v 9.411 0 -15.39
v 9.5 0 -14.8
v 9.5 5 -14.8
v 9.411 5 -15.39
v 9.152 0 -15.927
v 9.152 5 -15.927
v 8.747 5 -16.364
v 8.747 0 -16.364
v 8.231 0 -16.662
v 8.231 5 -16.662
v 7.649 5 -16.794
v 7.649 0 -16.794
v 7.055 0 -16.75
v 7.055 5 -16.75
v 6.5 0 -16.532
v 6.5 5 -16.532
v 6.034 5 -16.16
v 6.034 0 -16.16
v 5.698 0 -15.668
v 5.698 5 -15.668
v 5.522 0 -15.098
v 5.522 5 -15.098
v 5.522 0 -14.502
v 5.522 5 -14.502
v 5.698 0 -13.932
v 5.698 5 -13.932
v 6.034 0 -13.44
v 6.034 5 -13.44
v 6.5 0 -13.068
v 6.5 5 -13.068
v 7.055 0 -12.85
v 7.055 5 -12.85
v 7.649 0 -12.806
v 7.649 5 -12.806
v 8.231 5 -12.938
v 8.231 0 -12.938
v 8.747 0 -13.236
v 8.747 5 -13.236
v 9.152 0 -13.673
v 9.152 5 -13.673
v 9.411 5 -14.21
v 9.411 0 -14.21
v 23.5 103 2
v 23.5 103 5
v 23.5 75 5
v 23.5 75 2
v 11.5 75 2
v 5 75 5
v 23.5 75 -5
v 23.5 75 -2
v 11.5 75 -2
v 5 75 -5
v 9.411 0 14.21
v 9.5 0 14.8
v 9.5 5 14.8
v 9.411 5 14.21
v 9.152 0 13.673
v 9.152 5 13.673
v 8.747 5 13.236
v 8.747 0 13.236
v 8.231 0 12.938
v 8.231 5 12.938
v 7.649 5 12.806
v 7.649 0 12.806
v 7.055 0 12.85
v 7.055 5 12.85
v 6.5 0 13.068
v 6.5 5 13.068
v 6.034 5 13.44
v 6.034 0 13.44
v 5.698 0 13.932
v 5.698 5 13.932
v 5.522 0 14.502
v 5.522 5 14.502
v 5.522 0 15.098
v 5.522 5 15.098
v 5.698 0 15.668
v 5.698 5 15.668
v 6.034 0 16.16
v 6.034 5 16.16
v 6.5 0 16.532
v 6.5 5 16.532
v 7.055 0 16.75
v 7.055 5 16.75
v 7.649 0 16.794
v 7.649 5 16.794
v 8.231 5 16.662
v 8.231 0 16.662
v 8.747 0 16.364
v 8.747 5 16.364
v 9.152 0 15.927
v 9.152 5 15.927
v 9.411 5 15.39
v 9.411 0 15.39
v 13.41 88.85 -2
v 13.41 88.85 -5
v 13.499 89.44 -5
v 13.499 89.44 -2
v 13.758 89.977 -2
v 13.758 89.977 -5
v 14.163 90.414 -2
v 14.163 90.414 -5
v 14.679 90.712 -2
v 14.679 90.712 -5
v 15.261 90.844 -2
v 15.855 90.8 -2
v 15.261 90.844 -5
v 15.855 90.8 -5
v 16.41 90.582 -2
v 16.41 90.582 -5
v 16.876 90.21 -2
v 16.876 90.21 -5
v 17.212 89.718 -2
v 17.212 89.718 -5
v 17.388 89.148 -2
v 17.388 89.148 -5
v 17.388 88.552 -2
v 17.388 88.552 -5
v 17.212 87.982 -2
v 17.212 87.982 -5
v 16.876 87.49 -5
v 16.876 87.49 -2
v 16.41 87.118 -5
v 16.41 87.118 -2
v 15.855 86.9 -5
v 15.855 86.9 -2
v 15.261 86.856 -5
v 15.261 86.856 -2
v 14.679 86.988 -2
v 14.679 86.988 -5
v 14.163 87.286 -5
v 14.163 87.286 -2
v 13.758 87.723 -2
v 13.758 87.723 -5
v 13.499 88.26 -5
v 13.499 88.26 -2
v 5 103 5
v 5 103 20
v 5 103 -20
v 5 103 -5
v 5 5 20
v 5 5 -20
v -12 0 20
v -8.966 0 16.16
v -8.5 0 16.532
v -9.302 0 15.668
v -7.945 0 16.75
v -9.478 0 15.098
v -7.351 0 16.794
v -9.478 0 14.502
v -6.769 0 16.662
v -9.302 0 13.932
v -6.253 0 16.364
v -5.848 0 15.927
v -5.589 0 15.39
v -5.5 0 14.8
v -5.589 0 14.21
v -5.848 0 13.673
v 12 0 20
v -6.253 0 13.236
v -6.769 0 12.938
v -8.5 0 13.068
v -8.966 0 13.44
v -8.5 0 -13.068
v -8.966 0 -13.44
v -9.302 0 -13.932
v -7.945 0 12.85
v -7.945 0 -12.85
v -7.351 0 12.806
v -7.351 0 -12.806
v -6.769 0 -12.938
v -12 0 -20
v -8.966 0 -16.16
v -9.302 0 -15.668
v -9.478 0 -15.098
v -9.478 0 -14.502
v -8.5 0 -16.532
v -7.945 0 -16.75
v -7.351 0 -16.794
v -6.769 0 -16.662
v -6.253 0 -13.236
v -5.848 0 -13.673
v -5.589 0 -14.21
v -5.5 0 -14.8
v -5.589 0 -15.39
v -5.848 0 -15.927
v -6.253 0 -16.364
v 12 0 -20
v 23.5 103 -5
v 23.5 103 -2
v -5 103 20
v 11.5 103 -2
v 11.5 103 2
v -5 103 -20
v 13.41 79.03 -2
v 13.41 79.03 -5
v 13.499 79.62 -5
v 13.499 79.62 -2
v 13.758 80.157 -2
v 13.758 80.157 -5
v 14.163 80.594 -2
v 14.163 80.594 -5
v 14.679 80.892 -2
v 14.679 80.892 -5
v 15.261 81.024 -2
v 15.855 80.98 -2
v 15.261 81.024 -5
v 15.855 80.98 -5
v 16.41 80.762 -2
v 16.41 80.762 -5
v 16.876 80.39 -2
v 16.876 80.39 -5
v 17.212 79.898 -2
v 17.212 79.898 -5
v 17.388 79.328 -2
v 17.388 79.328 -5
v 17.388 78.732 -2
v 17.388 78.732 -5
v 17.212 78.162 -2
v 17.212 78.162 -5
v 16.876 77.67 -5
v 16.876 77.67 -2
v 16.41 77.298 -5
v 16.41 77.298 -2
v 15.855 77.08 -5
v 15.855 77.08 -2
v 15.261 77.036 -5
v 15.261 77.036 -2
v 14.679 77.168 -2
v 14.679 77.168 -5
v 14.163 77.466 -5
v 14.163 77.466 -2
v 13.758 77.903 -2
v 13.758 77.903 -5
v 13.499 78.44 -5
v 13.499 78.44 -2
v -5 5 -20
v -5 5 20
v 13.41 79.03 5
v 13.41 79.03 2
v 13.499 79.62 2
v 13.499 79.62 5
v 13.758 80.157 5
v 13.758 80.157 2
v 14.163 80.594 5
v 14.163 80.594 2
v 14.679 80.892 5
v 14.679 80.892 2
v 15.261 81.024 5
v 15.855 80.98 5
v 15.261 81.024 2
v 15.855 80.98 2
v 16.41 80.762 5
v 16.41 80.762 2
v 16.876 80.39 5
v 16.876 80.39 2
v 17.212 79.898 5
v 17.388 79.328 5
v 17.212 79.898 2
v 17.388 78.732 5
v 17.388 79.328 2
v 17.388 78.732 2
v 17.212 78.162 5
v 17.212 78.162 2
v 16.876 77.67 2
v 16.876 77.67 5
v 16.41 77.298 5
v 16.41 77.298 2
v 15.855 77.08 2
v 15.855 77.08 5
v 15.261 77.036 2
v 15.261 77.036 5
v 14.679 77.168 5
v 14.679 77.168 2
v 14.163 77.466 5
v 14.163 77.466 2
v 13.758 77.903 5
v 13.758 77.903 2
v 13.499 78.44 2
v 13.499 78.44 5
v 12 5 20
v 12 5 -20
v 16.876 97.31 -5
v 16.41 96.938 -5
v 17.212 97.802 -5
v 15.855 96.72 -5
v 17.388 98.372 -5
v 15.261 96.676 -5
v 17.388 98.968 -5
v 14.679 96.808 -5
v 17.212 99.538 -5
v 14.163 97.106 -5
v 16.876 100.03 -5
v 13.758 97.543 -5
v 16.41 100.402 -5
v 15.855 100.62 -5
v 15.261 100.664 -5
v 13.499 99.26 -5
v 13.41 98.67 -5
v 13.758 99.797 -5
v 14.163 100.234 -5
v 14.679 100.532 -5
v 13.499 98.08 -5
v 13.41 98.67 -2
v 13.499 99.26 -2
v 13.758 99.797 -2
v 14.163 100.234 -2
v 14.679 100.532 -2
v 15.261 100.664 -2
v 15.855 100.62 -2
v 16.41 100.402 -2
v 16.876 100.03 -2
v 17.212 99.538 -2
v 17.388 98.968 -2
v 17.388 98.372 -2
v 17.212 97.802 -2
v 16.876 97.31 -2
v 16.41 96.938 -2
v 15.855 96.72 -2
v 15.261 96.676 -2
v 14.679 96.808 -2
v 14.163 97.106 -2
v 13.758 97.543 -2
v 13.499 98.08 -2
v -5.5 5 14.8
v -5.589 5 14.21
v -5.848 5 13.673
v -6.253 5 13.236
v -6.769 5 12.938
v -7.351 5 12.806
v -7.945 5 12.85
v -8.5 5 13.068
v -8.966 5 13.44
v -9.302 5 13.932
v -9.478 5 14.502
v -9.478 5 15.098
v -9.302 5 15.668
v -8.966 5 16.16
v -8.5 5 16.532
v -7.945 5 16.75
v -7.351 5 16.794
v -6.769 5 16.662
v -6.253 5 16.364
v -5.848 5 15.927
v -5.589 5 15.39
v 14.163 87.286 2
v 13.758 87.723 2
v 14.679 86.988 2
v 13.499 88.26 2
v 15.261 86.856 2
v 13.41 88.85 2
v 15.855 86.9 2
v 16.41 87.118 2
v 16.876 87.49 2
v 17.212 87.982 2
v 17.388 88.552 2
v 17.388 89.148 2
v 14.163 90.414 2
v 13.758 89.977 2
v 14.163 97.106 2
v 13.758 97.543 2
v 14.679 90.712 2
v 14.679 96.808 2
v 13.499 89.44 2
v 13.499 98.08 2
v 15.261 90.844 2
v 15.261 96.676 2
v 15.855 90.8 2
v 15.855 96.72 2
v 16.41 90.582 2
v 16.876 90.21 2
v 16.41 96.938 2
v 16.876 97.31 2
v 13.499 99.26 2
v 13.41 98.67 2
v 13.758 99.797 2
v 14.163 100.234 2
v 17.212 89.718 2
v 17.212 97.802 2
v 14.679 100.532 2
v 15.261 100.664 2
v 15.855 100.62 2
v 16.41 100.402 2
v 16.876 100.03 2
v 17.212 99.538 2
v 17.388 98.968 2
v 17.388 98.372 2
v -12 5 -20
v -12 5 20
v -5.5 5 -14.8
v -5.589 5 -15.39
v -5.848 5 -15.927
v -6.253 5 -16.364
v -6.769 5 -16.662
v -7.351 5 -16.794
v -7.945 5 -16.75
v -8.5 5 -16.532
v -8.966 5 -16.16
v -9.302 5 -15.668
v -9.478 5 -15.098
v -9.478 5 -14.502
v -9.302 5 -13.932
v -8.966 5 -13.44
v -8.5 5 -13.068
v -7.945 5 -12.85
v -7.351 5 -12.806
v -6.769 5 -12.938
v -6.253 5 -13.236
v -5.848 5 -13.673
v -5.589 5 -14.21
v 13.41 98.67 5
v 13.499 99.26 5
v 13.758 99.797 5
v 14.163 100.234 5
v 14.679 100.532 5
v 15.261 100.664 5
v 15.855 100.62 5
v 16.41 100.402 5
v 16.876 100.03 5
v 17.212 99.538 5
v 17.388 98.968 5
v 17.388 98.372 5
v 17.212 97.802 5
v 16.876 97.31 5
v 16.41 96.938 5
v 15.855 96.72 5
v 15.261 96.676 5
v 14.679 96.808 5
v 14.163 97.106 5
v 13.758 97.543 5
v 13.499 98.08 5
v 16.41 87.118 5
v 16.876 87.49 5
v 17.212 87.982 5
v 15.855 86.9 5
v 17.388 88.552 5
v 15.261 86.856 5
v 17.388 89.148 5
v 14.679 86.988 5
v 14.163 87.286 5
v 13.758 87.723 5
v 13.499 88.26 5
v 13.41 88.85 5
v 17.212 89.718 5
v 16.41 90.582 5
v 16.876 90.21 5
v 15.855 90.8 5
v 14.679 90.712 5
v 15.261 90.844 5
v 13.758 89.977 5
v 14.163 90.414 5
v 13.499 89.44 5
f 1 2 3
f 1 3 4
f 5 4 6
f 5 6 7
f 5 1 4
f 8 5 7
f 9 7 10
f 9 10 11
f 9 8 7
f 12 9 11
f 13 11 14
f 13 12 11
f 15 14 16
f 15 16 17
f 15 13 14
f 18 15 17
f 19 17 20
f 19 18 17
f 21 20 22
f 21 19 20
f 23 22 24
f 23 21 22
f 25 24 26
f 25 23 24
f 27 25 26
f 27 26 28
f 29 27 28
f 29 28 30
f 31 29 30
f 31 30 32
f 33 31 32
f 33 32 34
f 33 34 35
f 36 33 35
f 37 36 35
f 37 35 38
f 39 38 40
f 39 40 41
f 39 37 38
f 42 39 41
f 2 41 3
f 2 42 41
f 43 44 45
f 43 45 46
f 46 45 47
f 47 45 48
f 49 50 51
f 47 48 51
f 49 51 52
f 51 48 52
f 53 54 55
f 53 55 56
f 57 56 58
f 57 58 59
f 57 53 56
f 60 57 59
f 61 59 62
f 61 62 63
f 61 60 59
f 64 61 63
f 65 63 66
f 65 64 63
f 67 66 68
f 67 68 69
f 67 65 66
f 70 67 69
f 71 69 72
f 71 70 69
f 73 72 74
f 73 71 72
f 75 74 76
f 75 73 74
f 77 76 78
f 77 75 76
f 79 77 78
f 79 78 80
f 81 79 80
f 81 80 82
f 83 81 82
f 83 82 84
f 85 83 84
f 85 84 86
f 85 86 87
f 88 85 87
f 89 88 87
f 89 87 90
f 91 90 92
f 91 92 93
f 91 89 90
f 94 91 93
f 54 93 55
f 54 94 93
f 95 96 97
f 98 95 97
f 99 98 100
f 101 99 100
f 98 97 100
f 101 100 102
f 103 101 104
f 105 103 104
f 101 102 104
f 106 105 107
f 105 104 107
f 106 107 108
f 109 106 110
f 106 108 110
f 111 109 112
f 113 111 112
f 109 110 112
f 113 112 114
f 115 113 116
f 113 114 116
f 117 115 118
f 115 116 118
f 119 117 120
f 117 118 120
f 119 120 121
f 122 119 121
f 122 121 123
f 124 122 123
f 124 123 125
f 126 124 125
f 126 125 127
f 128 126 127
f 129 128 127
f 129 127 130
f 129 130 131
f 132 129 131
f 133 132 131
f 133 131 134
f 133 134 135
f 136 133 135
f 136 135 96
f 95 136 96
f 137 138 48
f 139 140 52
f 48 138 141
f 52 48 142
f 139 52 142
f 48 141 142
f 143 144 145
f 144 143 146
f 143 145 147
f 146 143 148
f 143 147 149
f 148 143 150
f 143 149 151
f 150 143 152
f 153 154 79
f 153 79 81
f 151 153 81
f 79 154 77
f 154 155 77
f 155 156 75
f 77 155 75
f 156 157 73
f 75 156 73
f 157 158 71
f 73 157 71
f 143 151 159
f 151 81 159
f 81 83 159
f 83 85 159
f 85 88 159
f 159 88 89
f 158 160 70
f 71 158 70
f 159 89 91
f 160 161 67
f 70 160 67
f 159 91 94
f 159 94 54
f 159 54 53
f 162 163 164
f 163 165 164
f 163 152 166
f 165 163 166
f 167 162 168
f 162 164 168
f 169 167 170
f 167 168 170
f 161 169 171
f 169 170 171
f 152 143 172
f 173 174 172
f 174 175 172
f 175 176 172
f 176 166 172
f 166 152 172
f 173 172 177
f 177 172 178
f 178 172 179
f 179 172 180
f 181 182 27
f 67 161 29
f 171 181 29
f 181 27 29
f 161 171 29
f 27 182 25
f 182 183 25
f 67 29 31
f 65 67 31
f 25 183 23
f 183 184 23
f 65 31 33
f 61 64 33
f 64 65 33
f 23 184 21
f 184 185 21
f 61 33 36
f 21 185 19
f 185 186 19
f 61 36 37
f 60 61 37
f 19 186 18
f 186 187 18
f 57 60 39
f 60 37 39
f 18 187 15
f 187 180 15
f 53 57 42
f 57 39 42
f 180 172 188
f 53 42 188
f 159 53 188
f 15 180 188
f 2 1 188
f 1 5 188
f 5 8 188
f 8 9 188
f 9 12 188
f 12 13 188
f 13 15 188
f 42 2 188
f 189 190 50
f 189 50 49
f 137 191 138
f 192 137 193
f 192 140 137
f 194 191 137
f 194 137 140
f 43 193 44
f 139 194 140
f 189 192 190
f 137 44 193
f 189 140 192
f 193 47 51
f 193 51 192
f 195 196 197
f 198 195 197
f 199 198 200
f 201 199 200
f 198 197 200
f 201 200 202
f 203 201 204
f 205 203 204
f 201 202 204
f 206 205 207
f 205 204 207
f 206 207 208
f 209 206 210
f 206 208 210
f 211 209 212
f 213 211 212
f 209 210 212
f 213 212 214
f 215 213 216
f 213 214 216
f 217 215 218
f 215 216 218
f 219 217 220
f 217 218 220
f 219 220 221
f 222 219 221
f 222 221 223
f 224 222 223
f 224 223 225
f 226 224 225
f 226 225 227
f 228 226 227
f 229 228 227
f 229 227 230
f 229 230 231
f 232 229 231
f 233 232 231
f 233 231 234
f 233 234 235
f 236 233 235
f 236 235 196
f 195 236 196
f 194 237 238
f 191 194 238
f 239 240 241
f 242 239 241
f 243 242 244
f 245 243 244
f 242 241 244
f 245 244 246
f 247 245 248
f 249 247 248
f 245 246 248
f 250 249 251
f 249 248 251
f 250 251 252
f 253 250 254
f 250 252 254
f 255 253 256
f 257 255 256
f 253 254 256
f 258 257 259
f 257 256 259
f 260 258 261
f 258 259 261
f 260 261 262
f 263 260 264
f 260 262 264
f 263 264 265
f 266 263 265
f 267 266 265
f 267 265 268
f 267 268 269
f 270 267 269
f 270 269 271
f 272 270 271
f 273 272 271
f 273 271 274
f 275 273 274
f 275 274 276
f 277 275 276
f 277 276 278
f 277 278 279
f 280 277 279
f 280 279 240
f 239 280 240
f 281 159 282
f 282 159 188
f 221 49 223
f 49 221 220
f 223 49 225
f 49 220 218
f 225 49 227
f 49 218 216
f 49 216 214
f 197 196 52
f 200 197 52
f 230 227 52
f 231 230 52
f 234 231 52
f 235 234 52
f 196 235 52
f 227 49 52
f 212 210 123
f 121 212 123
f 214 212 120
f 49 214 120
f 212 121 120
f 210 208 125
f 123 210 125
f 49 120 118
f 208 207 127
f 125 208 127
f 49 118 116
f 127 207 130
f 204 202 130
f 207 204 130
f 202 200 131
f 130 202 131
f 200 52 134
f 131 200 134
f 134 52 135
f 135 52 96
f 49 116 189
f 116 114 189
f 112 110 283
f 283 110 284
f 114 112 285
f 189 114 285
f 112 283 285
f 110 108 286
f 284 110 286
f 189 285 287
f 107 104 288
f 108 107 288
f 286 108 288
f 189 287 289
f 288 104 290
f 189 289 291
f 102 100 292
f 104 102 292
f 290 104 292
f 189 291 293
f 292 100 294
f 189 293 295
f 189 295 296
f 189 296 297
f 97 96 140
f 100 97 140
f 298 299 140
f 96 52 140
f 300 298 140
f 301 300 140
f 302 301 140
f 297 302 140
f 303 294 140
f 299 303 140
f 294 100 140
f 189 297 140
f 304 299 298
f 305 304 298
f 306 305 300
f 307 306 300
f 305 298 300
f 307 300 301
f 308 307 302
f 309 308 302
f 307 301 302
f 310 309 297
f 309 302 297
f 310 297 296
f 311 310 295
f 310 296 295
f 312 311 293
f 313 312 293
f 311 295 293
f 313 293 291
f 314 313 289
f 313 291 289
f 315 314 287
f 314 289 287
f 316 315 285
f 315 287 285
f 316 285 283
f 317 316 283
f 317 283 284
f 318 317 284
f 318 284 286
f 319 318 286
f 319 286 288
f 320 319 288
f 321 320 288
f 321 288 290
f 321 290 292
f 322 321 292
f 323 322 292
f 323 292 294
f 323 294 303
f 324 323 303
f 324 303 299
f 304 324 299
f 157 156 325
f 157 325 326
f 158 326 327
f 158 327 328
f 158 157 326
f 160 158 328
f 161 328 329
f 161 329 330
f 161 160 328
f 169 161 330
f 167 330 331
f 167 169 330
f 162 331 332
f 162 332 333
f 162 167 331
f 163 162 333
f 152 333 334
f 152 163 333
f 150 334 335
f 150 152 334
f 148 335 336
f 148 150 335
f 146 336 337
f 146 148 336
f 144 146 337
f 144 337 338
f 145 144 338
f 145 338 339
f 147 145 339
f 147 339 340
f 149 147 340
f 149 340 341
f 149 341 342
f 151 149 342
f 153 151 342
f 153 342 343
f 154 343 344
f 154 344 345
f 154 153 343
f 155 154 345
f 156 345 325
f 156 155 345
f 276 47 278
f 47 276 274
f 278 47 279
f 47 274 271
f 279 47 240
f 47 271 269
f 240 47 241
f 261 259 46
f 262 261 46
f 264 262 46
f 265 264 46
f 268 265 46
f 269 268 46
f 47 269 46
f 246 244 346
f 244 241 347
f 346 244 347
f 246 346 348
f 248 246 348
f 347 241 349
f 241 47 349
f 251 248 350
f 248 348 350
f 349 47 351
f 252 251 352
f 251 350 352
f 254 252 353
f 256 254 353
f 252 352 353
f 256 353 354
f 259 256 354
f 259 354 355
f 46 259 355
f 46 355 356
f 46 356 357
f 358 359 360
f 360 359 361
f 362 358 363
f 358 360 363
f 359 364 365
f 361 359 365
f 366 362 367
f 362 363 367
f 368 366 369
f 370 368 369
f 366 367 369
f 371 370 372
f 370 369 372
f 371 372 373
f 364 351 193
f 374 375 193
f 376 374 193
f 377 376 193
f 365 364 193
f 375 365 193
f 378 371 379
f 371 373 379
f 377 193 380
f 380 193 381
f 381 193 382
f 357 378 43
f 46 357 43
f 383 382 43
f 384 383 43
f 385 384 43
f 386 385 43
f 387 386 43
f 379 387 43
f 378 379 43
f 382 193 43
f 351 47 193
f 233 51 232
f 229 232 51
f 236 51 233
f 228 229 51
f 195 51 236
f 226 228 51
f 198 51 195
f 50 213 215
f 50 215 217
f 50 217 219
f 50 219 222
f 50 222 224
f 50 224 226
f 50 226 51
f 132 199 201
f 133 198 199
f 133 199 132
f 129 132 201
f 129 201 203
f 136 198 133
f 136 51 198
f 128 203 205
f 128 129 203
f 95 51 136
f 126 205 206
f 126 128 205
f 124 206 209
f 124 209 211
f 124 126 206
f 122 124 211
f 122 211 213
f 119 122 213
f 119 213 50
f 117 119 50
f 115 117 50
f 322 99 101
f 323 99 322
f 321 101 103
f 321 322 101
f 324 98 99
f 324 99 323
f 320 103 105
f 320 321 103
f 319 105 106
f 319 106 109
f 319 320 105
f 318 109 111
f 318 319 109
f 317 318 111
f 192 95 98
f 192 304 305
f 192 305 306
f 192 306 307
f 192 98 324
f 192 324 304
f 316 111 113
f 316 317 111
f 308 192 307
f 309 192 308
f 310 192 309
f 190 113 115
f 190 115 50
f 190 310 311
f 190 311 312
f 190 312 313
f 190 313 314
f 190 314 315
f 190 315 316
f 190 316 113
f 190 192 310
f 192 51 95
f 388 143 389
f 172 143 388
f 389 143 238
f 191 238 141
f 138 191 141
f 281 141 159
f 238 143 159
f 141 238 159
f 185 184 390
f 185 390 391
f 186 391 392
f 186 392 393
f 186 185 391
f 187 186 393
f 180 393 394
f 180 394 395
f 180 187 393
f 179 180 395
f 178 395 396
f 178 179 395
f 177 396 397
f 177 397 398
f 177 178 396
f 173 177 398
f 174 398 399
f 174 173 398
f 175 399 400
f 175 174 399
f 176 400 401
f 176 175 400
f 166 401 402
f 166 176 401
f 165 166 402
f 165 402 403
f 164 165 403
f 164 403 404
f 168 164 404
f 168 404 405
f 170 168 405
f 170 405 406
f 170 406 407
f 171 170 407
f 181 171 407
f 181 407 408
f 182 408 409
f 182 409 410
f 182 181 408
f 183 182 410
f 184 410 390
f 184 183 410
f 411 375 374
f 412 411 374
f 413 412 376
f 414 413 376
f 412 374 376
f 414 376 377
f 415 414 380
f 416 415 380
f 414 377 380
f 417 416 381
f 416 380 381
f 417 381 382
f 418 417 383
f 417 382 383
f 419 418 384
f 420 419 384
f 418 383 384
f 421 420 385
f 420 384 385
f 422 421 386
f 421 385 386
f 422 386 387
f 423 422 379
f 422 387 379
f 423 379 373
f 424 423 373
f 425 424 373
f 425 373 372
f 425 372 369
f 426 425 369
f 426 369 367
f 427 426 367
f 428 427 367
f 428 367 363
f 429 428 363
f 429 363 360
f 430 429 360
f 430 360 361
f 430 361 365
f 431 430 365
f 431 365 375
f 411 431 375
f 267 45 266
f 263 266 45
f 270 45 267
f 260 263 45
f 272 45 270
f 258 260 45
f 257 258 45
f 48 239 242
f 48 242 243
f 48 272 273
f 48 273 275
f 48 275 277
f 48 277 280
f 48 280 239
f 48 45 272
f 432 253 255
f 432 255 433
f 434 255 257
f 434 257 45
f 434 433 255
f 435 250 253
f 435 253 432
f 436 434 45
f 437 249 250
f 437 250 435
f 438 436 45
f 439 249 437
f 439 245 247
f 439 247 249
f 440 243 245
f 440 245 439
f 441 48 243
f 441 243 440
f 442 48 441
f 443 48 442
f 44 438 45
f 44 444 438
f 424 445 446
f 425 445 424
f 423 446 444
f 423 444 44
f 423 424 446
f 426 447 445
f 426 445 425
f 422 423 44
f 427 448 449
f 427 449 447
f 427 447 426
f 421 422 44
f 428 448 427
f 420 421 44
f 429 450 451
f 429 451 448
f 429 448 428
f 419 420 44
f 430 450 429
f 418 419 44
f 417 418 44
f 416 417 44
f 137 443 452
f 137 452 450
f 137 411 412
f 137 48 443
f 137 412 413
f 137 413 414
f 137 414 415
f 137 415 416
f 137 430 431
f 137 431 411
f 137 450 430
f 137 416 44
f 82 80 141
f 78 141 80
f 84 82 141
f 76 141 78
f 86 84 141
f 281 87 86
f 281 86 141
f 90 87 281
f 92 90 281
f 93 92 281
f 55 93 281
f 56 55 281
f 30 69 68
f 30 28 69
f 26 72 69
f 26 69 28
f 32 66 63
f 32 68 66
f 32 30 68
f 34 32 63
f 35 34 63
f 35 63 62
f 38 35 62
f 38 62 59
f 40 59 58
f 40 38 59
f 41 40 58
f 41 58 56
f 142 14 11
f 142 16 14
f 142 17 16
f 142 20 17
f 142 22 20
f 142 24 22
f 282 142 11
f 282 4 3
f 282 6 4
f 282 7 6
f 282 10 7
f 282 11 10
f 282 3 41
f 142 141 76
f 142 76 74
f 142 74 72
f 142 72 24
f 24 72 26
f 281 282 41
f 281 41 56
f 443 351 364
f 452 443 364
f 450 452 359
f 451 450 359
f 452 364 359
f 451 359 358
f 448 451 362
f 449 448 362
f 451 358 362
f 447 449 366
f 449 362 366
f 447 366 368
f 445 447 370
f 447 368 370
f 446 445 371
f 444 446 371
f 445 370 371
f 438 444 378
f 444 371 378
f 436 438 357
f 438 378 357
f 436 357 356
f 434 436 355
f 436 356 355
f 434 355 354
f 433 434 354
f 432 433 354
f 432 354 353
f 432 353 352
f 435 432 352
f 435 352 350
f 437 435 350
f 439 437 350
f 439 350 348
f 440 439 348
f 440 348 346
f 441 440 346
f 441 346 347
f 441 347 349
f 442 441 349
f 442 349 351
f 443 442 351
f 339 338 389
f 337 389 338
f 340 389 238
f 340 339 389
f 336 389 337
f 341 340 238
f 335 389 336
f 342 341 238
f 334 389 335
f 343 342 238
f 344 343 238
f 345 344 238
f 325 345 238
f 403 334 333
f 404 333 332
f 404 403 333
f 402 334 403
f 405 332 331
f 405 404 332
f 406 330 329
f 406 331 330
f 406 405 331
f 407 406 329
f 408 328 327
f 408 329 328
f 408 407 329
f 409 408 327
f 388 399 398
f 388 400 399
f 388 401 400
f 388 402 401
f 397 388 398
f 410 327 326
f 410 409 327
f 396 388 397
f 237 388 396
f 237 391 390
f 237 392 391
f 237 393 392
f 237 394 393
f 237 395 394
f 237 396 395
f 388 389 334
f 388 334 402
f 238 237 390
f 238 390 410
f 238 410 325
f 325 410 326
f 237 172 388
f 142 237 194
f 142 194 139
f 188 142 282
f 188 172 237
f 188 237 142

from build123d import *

# Parameters (mm, degrees)
SKETCH_1_W          = 24
SKETCH_1_H          = 40
SKETCH_1_R          = 2
EXTRUDE_1_DEPTH     = 5
EXTRUDE_5_DEPTH     = 98
SKETCH_10_W         = 10
SKETCH_10_H         = 28
EXTRUDE_6_DEPTH     = 18.5
SKETCH_12_R         = 2
CUT_EXTRUDE_4_DEPTH = 24.5
SKETCH_13_W         = 12
SKETCH_13_H         = 28
CUT_EXTRUDE_5_DEPTH = 2


with BuildPart() as part:
    # 草图1 → 凸台-拉伸1 (new body)
    with BuildSketch(Plane(origin=(0, 0, 0), x_dir=(1, 0, 0), z_dir=(0, 1, 0))):
        Rectangle(SKETCH_1_W, SKETCH_1_H)
        with Locations((7.5, -14.8)):
            Circle(SKETCH_1_R, mode=Mode.SUBTRACT)
        with Locations((-7.5, -14.8)):
            Circle(SKETCH_1_R, mode=Mode.SUBTRACT)
        with Locations((-7.5, 14.8)):
            Circle(SKETCH_1_R, mode=Mode.SUBTRACT)
        with Locations((7.5, 14.8)):
            Circle(SKETCH_1_R, mode=Mode.SUBTRACT)
    extrude(amount=EXTRUDE_1_DEPTH)

    # 草图8 → 凸台-拉伸5 (add)
    with BuildSketch(Plane(origin=(0, 5, 0), x_dir=(1, 0, 0), z_dir=(0, 1, 0))):
        Polygon((-5, 0), (-5, -20), (5, -20), (5, 20), (-5, 20), align=None)
    extrude(amount=EXTRUDE_5_DEPTH)

    # 草图10 → 凸台-拉伸6 (add)
    with BuildSketch(Plane(origin=(5, 0, 0), x_dir=(0, 0, -1), z_dir=(1, 0, 0))):
        with Locations((0, 89)):
            Rectangle(SKETCH_10_W, SKETCH_10_H)
    extrude(amount=EXTRUDE_6_DEPTH)

    # 草图12 → 切除-拉伸4 (cut)
    with BuildSketch(Plane(origin=(0, 0, -5), x_dir=(-1, 0, 0), z_dir=(0, 0, -1))):
        with Locations((-15.41, 98.67)):
            Circle(SKETCH_12_R)
        with Locations((-15.41, 88.85)):
            Circle(SKETCH_12_R)
        with Locations((-15.41, 79.03)):
            Circle(SKETCH_12_R)
    extrude(amount=-CUT_EXTRUDE_4_DEPTH, mode=Mode.SUBTRACT)

    # 草图13 → 切除-拉伸5 (cut, symmetric)
    with BuildSketch(Plane.XY):
        with Locations((17.5, 89)):
            Rectangle(SKETCH_13_W, SKETCH_13_H)
    extrude(amount=CUT_EXTRUDE_5_DEPTH, both=True, mode=Mode.SUBTRACT)


solid = part.part
